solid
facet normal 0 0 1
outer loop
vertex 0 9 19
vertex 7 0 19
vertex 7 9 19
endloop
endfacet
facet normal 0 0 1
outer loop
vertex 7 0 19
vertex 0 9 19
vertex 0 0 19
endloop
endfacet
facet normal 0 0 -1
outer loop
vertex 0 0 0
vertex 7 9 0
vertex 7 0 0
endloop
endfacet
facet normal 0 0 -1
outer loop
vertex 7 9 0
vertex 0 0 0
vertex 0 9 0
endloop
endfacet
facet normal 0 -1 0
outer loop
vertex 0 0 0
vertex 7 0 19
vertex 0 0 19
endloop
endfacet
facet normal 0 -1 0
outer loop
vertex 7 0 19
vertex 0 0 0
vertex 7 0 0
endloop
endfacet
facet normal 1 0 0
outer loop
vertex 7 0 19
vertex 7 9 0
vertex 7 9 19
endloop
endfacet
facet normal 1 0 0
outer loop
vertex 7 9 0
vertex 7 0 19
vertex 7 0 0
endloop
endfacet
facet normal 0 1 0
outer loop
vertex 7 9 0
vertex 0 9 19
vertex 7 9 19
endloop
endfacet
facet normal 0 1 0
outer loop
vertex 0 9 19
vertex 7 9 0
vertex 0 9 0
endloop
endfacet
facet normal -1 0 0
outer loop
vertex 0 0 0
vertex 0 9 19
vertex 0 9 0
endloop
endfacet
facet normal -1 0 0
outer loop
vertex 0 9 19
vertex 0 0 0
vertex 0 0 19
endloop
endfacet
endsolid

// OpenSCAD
// Generated by SolidPython 1.0.1 on 2020-07-29 00:39:26


cube(size = [7, 9, 19]);
/***********************************************
*********      SolidPython code:      **********
************************************************
 
# import packages: SolidPython
from solid import *
from solid.utils import *
from itertools import chain, combinations


class Resize:

    def __init__(self, scad_file):
        self.scad_file = scad_file
        #self.scad_file = import_scad(scad_file)
        # cone/cylinder param:
        self.r1 = 0
        self.r2 = 0
        self.h = 0
        # rectangular prism param:
        self.w = 0
        self.l = 0
        # ellipse param:
        self.r = 0

    # import OpenScad code (file name corresponds to shape)


    # classify shape + parameters
    def assign(self, param1, param2, param3):
        if self.scad_file == 'cone.scad':
            self.r1 = param1
            self.r2 = param2
            self.h = param3
        elif self.scad_file == 'cylinder.scad':
            self.r1 = param1
            self.r2 = param2
            self.h = param3
        elif self.scad_file == 'rectangularPrism.scad':
            self.h = param1
            self.l = param2
            self.w = param3
        else:
            self.r = param1
            self.h = param2

    # resize parameters
    def iterate(self):
        x = range(3, 20, 2)
        i = 1
        if self.scad_file == 'cone.scad':
            tempList = list(combinations(x, 2))
            for temp in tempList:
                param1 = temp[0]
                param2 = temp[1]
                filepath = 'produced_scad_files/' + 'cone' + str(param1) + '_' + str(param2) + '_' + '.scad'
                scad_render_to_file(cylinder(h=param1, r1=param2, r2=0), filepath)

        elif self.scad_file == 'cylinder.scad':
            tempList = list(combinations(x, 3))
            for temp in tempList:
                param1 = temp[0]
                param2 = temp[1]
                filepath = 'produced_scad_files/' + 'cylinder' + str(param1) + '_' + str(param2) + '_' + '.scad'
                scad_render_to_file(cylinder(h=param1, r1=param2, r2=param2), filepath)

        elif self.scad_file == 'rectangularPrism.scad':
            tempList = list(combinations(x, 3))
            for temp in tempList:
                param1 = temp[0]
                param2 = temp[1]
                param3 = temp[2]
                filepath = 'produced_scad_files/' + 'rectangularPrism' + str(param1) + '_' + str(param2) + '_' + str(
                    param3) + '.scad'
                scad_render_to_file(cube(size=(param1, param2, param3)), filepath)

        elif self.scad_file == 'ellipse.scad':
            tempList = list(combinations(x, 4))
            for temp in tempList:
                param1 = temp[0]
                param2 = temp[1]
                param3 = temp[2]
                param4 = temp[3]
                filepath = 'produced_scad_files/' + 'ellipse' + str(param1) + '_' + str(param2) + '_' + str(param3) + '_' + str(param4) + '.scad'
                scad_render_to_file(scale([param1, param2, param3])(sphere(r=param4)), filepath)

    def render_to_scadfile(self):
        scad_render_to_file(scad, 'example.scad') 
 
************************************************/
